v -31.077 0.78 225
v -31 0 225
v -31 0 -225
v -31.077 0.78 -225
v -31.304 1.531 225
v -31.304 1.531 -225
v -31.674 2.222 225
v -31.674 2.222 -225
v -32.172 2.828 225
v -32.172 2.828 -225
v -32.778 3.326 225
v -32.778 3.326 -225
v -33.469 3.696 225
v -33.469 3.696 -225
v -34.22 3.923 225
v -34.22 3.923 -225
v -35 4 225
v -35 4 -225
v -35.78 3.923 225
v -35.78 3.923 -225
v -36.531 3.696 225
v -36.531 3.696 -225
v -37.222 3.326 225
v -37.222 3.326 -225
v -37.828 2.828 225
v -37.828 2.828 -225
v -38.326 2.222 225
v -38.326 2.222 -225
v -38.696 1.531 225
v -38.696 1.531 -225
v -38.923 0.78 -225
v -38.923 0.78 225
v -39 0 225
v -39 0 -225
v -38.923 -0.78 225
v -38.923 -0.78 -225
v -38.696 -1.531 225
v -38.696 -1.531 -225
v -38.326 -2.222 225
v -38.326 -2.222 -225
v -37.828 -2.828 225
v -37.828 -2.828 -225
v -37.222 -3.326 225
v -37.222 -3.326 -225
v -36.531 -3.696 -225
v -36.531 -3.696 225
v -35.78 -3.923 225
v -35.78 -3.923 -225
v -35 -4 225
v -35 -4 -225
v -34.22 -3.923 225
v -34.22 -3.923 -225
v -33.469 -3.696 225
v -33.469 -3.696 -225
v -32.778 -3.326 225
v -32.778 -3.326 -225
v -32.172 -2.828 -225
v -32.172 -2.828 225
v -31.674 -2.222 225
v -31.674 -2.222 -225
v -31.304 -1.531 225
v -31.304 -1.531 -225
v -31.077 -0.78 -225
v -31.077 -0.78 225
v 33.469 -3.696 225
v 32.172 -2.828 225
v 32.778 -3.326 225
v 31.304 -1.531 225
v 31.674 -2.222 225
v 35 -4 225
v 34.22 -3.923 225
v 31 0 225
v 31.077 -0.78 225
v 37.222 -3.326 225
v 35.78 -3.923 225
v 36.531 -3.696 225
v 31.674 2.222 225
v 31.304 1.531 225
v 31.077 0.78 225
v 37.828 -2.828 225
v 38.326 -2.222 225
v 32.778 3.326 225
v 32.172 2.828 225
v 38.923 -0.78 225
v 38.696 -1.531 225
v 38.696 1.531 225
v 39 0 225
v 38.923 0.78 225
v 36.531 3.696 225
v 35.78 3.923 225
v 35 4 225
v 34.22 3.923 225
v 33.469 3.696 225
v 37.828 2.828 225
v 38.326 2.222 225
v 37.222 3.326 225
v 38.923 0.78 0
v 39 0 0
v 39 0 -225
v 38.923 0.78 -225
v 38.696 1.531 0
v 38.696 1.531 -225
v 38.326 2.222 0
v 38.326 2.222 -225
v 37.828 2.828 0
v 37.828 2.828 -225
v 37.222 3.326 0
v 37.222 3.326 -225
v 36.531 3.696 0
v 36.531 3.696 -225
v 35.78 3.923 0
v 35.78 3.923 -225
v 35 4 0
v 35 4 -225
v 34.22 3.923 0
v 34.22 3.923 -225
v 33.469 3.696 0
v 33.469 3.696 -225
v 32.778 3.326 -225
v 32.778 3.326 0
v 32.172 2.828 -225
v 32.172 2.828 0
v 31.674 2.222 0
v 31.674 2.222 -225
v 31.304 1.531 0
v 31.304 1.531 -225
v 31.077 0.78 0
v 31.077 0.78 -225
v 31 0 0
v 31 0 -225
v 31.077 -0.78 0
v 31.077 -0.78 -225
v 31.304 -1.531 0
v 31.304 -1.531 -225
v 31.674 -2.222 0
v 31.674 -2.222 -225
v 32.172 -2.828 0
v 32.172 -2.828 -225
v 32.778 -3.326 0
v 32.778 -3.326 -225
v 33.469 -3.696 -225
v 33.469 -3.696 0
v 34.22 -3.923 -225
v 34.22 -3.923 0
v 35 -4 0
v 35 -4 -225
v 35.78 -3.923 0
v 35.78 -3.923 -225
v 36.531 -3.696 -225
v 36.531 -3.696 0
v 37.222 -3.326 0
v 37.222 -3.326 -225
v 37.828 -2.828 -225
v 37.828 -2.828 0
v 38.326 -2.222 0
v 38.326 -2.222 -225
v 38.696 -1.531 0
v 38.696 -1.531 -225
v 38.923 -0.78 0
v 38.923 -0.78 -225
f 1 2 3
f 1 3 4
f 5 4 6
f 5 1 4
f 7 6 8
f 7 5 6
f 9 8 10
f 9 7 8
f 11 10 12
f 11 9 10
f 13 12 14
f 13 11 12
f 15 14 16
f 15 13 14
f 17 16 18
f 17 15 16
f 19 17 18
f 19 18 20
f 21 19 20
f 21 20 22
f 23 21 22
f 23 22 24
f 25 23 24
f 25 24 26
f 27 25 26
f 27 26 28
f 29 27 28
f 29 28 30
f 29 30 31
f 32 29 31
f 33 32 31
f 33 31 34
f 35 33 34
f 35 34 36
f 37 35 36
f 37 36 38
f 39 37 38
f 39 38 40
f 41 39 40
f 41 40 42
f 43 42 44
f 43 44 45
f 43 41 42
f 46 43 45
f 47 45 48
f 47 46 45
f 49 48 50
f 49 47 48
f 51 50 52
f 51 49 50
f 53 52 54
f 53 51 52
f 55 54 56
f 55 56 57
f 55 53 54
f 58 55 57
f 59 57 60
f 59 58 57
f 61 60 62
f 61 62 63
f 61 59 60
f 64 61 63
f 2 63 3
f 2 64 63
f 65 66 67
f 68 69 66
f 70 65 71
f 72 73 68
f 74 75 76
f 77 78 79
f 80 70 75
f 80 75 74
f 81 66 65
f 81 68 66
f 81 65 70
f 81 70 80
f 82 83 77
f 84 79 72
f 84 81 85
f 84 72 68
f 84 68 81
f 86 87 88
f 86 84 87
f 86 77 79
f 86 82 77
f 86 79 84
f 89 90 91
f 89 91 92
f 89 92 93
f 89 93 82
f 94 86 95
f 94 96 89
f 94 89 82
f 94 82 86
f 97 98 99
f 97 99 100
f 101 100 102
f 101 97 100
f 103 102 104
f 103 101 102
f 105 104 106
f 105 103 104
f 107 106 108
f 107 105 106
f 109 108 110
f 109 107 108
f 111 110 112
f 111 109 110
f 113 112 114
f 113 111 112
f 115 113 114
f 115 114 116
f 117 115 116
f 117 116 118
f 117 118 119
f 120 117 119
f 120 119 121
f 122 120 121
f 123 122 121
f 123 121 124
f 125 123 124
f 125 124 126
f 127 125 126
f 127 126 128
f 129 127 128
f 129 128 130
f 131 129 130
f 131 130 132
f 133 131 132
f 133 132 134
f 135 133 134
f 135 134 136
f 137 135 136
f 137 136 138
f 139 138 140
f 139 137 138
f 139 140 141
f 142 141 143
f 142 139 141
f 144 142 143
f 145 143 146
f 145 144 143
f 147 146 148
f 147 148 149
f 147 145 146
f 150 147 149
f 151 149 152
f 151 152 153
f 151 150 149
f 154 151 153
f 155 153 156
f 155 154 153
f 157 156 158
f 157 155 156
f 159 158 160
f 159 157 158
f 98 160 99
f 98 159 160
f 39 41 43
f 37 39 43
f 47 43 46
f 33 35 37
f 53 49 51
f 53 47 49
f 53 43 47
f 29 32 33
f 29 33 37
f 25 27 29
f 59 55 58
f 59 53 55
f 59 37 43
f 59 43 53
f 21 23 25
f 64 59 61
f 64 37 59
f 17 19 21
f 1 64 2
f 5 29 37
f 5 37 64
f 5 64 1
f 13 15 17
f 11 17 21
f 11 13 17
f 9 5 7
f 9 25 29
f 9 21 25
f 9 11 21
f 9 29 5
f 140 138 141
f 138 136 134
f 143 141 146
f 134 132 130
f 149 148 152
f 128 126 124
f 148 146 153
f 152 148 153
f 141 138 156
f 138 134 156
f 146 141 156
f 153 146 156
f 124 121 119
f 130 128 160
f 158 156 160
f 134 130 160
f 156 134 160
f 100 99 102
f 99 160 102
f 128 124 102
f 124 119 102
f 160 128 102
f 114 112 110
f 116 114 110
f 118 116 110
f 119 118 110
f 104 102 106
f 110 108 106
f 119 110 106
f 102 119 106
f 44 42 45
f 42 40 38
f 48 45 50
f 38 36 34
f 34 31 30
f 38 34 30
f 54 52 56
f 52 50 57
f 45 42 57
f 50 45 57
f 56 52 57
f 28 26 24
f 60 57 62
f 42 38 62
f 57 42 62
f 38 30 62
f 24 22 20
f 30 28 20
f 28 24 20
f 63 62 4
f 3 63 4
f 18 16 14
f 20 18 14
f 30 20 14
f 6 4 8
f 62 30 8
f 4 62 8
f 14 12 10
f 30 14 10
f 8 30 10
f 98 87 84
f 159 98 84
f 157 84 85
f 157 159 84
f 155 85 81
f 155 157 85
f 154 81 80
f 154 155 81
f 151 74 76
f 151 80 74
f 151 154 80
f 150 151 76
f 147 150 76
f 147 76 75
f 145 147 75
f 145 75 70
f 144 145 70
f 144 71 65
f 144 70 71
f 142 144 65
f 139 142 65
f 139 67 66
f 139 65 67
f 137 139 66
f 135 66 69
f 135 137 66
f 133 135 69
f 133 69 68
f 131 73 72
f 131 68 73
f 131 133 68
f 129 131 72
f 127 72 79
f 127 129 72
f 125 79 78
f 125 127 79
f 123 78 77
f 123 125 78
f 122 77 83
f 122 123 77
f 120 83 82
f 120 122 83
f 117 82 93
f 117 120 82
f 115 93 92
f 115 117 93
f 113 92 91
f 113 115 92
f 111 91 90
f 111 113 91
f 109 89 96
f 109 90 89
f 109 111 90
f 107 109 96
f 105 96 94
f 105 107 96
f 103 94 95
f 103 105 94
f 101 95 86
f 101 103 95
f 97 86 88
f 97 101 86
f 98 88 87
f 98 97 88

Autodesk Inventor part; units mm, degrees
ref_plane "YZ Plane" through (0, 0, 0) normal (1, 0, 0) x (0, 1, 0)
ref_plane "XZ Plane" through (0, 0, 0) normal (0, 1, 0) x (-1, 0, 0)
ref_plane "XY Plane" through (0, 0, 0) normal (0, 0, 1) x (1, 0, 0)
sketch "Sketch1" plane through (0, 0, 0) normal (0, 0, 1) x (1, 0, 0)
  circle A0 centre (-35, 0) radius 4
  circle A1 centre (35, 0) radius 4
  line L0 (-39, 25.4958) -> (-39, -25.829)
  line L1 (39, 25.4958) -> (39, -25.829)
  point P0 (0, 0)
  dimension "d2" = 78
  dimension "d4" = 39
  dimension "d5" = 8
  dimension "d8" = 70
extrude "Extrusion1" add sketch "Sketch1" along normal mid plane 450
equation "\"d4\" = 0.5 * d2"
properties part number "top carriage" material "Aluminum 6061-AHC"
